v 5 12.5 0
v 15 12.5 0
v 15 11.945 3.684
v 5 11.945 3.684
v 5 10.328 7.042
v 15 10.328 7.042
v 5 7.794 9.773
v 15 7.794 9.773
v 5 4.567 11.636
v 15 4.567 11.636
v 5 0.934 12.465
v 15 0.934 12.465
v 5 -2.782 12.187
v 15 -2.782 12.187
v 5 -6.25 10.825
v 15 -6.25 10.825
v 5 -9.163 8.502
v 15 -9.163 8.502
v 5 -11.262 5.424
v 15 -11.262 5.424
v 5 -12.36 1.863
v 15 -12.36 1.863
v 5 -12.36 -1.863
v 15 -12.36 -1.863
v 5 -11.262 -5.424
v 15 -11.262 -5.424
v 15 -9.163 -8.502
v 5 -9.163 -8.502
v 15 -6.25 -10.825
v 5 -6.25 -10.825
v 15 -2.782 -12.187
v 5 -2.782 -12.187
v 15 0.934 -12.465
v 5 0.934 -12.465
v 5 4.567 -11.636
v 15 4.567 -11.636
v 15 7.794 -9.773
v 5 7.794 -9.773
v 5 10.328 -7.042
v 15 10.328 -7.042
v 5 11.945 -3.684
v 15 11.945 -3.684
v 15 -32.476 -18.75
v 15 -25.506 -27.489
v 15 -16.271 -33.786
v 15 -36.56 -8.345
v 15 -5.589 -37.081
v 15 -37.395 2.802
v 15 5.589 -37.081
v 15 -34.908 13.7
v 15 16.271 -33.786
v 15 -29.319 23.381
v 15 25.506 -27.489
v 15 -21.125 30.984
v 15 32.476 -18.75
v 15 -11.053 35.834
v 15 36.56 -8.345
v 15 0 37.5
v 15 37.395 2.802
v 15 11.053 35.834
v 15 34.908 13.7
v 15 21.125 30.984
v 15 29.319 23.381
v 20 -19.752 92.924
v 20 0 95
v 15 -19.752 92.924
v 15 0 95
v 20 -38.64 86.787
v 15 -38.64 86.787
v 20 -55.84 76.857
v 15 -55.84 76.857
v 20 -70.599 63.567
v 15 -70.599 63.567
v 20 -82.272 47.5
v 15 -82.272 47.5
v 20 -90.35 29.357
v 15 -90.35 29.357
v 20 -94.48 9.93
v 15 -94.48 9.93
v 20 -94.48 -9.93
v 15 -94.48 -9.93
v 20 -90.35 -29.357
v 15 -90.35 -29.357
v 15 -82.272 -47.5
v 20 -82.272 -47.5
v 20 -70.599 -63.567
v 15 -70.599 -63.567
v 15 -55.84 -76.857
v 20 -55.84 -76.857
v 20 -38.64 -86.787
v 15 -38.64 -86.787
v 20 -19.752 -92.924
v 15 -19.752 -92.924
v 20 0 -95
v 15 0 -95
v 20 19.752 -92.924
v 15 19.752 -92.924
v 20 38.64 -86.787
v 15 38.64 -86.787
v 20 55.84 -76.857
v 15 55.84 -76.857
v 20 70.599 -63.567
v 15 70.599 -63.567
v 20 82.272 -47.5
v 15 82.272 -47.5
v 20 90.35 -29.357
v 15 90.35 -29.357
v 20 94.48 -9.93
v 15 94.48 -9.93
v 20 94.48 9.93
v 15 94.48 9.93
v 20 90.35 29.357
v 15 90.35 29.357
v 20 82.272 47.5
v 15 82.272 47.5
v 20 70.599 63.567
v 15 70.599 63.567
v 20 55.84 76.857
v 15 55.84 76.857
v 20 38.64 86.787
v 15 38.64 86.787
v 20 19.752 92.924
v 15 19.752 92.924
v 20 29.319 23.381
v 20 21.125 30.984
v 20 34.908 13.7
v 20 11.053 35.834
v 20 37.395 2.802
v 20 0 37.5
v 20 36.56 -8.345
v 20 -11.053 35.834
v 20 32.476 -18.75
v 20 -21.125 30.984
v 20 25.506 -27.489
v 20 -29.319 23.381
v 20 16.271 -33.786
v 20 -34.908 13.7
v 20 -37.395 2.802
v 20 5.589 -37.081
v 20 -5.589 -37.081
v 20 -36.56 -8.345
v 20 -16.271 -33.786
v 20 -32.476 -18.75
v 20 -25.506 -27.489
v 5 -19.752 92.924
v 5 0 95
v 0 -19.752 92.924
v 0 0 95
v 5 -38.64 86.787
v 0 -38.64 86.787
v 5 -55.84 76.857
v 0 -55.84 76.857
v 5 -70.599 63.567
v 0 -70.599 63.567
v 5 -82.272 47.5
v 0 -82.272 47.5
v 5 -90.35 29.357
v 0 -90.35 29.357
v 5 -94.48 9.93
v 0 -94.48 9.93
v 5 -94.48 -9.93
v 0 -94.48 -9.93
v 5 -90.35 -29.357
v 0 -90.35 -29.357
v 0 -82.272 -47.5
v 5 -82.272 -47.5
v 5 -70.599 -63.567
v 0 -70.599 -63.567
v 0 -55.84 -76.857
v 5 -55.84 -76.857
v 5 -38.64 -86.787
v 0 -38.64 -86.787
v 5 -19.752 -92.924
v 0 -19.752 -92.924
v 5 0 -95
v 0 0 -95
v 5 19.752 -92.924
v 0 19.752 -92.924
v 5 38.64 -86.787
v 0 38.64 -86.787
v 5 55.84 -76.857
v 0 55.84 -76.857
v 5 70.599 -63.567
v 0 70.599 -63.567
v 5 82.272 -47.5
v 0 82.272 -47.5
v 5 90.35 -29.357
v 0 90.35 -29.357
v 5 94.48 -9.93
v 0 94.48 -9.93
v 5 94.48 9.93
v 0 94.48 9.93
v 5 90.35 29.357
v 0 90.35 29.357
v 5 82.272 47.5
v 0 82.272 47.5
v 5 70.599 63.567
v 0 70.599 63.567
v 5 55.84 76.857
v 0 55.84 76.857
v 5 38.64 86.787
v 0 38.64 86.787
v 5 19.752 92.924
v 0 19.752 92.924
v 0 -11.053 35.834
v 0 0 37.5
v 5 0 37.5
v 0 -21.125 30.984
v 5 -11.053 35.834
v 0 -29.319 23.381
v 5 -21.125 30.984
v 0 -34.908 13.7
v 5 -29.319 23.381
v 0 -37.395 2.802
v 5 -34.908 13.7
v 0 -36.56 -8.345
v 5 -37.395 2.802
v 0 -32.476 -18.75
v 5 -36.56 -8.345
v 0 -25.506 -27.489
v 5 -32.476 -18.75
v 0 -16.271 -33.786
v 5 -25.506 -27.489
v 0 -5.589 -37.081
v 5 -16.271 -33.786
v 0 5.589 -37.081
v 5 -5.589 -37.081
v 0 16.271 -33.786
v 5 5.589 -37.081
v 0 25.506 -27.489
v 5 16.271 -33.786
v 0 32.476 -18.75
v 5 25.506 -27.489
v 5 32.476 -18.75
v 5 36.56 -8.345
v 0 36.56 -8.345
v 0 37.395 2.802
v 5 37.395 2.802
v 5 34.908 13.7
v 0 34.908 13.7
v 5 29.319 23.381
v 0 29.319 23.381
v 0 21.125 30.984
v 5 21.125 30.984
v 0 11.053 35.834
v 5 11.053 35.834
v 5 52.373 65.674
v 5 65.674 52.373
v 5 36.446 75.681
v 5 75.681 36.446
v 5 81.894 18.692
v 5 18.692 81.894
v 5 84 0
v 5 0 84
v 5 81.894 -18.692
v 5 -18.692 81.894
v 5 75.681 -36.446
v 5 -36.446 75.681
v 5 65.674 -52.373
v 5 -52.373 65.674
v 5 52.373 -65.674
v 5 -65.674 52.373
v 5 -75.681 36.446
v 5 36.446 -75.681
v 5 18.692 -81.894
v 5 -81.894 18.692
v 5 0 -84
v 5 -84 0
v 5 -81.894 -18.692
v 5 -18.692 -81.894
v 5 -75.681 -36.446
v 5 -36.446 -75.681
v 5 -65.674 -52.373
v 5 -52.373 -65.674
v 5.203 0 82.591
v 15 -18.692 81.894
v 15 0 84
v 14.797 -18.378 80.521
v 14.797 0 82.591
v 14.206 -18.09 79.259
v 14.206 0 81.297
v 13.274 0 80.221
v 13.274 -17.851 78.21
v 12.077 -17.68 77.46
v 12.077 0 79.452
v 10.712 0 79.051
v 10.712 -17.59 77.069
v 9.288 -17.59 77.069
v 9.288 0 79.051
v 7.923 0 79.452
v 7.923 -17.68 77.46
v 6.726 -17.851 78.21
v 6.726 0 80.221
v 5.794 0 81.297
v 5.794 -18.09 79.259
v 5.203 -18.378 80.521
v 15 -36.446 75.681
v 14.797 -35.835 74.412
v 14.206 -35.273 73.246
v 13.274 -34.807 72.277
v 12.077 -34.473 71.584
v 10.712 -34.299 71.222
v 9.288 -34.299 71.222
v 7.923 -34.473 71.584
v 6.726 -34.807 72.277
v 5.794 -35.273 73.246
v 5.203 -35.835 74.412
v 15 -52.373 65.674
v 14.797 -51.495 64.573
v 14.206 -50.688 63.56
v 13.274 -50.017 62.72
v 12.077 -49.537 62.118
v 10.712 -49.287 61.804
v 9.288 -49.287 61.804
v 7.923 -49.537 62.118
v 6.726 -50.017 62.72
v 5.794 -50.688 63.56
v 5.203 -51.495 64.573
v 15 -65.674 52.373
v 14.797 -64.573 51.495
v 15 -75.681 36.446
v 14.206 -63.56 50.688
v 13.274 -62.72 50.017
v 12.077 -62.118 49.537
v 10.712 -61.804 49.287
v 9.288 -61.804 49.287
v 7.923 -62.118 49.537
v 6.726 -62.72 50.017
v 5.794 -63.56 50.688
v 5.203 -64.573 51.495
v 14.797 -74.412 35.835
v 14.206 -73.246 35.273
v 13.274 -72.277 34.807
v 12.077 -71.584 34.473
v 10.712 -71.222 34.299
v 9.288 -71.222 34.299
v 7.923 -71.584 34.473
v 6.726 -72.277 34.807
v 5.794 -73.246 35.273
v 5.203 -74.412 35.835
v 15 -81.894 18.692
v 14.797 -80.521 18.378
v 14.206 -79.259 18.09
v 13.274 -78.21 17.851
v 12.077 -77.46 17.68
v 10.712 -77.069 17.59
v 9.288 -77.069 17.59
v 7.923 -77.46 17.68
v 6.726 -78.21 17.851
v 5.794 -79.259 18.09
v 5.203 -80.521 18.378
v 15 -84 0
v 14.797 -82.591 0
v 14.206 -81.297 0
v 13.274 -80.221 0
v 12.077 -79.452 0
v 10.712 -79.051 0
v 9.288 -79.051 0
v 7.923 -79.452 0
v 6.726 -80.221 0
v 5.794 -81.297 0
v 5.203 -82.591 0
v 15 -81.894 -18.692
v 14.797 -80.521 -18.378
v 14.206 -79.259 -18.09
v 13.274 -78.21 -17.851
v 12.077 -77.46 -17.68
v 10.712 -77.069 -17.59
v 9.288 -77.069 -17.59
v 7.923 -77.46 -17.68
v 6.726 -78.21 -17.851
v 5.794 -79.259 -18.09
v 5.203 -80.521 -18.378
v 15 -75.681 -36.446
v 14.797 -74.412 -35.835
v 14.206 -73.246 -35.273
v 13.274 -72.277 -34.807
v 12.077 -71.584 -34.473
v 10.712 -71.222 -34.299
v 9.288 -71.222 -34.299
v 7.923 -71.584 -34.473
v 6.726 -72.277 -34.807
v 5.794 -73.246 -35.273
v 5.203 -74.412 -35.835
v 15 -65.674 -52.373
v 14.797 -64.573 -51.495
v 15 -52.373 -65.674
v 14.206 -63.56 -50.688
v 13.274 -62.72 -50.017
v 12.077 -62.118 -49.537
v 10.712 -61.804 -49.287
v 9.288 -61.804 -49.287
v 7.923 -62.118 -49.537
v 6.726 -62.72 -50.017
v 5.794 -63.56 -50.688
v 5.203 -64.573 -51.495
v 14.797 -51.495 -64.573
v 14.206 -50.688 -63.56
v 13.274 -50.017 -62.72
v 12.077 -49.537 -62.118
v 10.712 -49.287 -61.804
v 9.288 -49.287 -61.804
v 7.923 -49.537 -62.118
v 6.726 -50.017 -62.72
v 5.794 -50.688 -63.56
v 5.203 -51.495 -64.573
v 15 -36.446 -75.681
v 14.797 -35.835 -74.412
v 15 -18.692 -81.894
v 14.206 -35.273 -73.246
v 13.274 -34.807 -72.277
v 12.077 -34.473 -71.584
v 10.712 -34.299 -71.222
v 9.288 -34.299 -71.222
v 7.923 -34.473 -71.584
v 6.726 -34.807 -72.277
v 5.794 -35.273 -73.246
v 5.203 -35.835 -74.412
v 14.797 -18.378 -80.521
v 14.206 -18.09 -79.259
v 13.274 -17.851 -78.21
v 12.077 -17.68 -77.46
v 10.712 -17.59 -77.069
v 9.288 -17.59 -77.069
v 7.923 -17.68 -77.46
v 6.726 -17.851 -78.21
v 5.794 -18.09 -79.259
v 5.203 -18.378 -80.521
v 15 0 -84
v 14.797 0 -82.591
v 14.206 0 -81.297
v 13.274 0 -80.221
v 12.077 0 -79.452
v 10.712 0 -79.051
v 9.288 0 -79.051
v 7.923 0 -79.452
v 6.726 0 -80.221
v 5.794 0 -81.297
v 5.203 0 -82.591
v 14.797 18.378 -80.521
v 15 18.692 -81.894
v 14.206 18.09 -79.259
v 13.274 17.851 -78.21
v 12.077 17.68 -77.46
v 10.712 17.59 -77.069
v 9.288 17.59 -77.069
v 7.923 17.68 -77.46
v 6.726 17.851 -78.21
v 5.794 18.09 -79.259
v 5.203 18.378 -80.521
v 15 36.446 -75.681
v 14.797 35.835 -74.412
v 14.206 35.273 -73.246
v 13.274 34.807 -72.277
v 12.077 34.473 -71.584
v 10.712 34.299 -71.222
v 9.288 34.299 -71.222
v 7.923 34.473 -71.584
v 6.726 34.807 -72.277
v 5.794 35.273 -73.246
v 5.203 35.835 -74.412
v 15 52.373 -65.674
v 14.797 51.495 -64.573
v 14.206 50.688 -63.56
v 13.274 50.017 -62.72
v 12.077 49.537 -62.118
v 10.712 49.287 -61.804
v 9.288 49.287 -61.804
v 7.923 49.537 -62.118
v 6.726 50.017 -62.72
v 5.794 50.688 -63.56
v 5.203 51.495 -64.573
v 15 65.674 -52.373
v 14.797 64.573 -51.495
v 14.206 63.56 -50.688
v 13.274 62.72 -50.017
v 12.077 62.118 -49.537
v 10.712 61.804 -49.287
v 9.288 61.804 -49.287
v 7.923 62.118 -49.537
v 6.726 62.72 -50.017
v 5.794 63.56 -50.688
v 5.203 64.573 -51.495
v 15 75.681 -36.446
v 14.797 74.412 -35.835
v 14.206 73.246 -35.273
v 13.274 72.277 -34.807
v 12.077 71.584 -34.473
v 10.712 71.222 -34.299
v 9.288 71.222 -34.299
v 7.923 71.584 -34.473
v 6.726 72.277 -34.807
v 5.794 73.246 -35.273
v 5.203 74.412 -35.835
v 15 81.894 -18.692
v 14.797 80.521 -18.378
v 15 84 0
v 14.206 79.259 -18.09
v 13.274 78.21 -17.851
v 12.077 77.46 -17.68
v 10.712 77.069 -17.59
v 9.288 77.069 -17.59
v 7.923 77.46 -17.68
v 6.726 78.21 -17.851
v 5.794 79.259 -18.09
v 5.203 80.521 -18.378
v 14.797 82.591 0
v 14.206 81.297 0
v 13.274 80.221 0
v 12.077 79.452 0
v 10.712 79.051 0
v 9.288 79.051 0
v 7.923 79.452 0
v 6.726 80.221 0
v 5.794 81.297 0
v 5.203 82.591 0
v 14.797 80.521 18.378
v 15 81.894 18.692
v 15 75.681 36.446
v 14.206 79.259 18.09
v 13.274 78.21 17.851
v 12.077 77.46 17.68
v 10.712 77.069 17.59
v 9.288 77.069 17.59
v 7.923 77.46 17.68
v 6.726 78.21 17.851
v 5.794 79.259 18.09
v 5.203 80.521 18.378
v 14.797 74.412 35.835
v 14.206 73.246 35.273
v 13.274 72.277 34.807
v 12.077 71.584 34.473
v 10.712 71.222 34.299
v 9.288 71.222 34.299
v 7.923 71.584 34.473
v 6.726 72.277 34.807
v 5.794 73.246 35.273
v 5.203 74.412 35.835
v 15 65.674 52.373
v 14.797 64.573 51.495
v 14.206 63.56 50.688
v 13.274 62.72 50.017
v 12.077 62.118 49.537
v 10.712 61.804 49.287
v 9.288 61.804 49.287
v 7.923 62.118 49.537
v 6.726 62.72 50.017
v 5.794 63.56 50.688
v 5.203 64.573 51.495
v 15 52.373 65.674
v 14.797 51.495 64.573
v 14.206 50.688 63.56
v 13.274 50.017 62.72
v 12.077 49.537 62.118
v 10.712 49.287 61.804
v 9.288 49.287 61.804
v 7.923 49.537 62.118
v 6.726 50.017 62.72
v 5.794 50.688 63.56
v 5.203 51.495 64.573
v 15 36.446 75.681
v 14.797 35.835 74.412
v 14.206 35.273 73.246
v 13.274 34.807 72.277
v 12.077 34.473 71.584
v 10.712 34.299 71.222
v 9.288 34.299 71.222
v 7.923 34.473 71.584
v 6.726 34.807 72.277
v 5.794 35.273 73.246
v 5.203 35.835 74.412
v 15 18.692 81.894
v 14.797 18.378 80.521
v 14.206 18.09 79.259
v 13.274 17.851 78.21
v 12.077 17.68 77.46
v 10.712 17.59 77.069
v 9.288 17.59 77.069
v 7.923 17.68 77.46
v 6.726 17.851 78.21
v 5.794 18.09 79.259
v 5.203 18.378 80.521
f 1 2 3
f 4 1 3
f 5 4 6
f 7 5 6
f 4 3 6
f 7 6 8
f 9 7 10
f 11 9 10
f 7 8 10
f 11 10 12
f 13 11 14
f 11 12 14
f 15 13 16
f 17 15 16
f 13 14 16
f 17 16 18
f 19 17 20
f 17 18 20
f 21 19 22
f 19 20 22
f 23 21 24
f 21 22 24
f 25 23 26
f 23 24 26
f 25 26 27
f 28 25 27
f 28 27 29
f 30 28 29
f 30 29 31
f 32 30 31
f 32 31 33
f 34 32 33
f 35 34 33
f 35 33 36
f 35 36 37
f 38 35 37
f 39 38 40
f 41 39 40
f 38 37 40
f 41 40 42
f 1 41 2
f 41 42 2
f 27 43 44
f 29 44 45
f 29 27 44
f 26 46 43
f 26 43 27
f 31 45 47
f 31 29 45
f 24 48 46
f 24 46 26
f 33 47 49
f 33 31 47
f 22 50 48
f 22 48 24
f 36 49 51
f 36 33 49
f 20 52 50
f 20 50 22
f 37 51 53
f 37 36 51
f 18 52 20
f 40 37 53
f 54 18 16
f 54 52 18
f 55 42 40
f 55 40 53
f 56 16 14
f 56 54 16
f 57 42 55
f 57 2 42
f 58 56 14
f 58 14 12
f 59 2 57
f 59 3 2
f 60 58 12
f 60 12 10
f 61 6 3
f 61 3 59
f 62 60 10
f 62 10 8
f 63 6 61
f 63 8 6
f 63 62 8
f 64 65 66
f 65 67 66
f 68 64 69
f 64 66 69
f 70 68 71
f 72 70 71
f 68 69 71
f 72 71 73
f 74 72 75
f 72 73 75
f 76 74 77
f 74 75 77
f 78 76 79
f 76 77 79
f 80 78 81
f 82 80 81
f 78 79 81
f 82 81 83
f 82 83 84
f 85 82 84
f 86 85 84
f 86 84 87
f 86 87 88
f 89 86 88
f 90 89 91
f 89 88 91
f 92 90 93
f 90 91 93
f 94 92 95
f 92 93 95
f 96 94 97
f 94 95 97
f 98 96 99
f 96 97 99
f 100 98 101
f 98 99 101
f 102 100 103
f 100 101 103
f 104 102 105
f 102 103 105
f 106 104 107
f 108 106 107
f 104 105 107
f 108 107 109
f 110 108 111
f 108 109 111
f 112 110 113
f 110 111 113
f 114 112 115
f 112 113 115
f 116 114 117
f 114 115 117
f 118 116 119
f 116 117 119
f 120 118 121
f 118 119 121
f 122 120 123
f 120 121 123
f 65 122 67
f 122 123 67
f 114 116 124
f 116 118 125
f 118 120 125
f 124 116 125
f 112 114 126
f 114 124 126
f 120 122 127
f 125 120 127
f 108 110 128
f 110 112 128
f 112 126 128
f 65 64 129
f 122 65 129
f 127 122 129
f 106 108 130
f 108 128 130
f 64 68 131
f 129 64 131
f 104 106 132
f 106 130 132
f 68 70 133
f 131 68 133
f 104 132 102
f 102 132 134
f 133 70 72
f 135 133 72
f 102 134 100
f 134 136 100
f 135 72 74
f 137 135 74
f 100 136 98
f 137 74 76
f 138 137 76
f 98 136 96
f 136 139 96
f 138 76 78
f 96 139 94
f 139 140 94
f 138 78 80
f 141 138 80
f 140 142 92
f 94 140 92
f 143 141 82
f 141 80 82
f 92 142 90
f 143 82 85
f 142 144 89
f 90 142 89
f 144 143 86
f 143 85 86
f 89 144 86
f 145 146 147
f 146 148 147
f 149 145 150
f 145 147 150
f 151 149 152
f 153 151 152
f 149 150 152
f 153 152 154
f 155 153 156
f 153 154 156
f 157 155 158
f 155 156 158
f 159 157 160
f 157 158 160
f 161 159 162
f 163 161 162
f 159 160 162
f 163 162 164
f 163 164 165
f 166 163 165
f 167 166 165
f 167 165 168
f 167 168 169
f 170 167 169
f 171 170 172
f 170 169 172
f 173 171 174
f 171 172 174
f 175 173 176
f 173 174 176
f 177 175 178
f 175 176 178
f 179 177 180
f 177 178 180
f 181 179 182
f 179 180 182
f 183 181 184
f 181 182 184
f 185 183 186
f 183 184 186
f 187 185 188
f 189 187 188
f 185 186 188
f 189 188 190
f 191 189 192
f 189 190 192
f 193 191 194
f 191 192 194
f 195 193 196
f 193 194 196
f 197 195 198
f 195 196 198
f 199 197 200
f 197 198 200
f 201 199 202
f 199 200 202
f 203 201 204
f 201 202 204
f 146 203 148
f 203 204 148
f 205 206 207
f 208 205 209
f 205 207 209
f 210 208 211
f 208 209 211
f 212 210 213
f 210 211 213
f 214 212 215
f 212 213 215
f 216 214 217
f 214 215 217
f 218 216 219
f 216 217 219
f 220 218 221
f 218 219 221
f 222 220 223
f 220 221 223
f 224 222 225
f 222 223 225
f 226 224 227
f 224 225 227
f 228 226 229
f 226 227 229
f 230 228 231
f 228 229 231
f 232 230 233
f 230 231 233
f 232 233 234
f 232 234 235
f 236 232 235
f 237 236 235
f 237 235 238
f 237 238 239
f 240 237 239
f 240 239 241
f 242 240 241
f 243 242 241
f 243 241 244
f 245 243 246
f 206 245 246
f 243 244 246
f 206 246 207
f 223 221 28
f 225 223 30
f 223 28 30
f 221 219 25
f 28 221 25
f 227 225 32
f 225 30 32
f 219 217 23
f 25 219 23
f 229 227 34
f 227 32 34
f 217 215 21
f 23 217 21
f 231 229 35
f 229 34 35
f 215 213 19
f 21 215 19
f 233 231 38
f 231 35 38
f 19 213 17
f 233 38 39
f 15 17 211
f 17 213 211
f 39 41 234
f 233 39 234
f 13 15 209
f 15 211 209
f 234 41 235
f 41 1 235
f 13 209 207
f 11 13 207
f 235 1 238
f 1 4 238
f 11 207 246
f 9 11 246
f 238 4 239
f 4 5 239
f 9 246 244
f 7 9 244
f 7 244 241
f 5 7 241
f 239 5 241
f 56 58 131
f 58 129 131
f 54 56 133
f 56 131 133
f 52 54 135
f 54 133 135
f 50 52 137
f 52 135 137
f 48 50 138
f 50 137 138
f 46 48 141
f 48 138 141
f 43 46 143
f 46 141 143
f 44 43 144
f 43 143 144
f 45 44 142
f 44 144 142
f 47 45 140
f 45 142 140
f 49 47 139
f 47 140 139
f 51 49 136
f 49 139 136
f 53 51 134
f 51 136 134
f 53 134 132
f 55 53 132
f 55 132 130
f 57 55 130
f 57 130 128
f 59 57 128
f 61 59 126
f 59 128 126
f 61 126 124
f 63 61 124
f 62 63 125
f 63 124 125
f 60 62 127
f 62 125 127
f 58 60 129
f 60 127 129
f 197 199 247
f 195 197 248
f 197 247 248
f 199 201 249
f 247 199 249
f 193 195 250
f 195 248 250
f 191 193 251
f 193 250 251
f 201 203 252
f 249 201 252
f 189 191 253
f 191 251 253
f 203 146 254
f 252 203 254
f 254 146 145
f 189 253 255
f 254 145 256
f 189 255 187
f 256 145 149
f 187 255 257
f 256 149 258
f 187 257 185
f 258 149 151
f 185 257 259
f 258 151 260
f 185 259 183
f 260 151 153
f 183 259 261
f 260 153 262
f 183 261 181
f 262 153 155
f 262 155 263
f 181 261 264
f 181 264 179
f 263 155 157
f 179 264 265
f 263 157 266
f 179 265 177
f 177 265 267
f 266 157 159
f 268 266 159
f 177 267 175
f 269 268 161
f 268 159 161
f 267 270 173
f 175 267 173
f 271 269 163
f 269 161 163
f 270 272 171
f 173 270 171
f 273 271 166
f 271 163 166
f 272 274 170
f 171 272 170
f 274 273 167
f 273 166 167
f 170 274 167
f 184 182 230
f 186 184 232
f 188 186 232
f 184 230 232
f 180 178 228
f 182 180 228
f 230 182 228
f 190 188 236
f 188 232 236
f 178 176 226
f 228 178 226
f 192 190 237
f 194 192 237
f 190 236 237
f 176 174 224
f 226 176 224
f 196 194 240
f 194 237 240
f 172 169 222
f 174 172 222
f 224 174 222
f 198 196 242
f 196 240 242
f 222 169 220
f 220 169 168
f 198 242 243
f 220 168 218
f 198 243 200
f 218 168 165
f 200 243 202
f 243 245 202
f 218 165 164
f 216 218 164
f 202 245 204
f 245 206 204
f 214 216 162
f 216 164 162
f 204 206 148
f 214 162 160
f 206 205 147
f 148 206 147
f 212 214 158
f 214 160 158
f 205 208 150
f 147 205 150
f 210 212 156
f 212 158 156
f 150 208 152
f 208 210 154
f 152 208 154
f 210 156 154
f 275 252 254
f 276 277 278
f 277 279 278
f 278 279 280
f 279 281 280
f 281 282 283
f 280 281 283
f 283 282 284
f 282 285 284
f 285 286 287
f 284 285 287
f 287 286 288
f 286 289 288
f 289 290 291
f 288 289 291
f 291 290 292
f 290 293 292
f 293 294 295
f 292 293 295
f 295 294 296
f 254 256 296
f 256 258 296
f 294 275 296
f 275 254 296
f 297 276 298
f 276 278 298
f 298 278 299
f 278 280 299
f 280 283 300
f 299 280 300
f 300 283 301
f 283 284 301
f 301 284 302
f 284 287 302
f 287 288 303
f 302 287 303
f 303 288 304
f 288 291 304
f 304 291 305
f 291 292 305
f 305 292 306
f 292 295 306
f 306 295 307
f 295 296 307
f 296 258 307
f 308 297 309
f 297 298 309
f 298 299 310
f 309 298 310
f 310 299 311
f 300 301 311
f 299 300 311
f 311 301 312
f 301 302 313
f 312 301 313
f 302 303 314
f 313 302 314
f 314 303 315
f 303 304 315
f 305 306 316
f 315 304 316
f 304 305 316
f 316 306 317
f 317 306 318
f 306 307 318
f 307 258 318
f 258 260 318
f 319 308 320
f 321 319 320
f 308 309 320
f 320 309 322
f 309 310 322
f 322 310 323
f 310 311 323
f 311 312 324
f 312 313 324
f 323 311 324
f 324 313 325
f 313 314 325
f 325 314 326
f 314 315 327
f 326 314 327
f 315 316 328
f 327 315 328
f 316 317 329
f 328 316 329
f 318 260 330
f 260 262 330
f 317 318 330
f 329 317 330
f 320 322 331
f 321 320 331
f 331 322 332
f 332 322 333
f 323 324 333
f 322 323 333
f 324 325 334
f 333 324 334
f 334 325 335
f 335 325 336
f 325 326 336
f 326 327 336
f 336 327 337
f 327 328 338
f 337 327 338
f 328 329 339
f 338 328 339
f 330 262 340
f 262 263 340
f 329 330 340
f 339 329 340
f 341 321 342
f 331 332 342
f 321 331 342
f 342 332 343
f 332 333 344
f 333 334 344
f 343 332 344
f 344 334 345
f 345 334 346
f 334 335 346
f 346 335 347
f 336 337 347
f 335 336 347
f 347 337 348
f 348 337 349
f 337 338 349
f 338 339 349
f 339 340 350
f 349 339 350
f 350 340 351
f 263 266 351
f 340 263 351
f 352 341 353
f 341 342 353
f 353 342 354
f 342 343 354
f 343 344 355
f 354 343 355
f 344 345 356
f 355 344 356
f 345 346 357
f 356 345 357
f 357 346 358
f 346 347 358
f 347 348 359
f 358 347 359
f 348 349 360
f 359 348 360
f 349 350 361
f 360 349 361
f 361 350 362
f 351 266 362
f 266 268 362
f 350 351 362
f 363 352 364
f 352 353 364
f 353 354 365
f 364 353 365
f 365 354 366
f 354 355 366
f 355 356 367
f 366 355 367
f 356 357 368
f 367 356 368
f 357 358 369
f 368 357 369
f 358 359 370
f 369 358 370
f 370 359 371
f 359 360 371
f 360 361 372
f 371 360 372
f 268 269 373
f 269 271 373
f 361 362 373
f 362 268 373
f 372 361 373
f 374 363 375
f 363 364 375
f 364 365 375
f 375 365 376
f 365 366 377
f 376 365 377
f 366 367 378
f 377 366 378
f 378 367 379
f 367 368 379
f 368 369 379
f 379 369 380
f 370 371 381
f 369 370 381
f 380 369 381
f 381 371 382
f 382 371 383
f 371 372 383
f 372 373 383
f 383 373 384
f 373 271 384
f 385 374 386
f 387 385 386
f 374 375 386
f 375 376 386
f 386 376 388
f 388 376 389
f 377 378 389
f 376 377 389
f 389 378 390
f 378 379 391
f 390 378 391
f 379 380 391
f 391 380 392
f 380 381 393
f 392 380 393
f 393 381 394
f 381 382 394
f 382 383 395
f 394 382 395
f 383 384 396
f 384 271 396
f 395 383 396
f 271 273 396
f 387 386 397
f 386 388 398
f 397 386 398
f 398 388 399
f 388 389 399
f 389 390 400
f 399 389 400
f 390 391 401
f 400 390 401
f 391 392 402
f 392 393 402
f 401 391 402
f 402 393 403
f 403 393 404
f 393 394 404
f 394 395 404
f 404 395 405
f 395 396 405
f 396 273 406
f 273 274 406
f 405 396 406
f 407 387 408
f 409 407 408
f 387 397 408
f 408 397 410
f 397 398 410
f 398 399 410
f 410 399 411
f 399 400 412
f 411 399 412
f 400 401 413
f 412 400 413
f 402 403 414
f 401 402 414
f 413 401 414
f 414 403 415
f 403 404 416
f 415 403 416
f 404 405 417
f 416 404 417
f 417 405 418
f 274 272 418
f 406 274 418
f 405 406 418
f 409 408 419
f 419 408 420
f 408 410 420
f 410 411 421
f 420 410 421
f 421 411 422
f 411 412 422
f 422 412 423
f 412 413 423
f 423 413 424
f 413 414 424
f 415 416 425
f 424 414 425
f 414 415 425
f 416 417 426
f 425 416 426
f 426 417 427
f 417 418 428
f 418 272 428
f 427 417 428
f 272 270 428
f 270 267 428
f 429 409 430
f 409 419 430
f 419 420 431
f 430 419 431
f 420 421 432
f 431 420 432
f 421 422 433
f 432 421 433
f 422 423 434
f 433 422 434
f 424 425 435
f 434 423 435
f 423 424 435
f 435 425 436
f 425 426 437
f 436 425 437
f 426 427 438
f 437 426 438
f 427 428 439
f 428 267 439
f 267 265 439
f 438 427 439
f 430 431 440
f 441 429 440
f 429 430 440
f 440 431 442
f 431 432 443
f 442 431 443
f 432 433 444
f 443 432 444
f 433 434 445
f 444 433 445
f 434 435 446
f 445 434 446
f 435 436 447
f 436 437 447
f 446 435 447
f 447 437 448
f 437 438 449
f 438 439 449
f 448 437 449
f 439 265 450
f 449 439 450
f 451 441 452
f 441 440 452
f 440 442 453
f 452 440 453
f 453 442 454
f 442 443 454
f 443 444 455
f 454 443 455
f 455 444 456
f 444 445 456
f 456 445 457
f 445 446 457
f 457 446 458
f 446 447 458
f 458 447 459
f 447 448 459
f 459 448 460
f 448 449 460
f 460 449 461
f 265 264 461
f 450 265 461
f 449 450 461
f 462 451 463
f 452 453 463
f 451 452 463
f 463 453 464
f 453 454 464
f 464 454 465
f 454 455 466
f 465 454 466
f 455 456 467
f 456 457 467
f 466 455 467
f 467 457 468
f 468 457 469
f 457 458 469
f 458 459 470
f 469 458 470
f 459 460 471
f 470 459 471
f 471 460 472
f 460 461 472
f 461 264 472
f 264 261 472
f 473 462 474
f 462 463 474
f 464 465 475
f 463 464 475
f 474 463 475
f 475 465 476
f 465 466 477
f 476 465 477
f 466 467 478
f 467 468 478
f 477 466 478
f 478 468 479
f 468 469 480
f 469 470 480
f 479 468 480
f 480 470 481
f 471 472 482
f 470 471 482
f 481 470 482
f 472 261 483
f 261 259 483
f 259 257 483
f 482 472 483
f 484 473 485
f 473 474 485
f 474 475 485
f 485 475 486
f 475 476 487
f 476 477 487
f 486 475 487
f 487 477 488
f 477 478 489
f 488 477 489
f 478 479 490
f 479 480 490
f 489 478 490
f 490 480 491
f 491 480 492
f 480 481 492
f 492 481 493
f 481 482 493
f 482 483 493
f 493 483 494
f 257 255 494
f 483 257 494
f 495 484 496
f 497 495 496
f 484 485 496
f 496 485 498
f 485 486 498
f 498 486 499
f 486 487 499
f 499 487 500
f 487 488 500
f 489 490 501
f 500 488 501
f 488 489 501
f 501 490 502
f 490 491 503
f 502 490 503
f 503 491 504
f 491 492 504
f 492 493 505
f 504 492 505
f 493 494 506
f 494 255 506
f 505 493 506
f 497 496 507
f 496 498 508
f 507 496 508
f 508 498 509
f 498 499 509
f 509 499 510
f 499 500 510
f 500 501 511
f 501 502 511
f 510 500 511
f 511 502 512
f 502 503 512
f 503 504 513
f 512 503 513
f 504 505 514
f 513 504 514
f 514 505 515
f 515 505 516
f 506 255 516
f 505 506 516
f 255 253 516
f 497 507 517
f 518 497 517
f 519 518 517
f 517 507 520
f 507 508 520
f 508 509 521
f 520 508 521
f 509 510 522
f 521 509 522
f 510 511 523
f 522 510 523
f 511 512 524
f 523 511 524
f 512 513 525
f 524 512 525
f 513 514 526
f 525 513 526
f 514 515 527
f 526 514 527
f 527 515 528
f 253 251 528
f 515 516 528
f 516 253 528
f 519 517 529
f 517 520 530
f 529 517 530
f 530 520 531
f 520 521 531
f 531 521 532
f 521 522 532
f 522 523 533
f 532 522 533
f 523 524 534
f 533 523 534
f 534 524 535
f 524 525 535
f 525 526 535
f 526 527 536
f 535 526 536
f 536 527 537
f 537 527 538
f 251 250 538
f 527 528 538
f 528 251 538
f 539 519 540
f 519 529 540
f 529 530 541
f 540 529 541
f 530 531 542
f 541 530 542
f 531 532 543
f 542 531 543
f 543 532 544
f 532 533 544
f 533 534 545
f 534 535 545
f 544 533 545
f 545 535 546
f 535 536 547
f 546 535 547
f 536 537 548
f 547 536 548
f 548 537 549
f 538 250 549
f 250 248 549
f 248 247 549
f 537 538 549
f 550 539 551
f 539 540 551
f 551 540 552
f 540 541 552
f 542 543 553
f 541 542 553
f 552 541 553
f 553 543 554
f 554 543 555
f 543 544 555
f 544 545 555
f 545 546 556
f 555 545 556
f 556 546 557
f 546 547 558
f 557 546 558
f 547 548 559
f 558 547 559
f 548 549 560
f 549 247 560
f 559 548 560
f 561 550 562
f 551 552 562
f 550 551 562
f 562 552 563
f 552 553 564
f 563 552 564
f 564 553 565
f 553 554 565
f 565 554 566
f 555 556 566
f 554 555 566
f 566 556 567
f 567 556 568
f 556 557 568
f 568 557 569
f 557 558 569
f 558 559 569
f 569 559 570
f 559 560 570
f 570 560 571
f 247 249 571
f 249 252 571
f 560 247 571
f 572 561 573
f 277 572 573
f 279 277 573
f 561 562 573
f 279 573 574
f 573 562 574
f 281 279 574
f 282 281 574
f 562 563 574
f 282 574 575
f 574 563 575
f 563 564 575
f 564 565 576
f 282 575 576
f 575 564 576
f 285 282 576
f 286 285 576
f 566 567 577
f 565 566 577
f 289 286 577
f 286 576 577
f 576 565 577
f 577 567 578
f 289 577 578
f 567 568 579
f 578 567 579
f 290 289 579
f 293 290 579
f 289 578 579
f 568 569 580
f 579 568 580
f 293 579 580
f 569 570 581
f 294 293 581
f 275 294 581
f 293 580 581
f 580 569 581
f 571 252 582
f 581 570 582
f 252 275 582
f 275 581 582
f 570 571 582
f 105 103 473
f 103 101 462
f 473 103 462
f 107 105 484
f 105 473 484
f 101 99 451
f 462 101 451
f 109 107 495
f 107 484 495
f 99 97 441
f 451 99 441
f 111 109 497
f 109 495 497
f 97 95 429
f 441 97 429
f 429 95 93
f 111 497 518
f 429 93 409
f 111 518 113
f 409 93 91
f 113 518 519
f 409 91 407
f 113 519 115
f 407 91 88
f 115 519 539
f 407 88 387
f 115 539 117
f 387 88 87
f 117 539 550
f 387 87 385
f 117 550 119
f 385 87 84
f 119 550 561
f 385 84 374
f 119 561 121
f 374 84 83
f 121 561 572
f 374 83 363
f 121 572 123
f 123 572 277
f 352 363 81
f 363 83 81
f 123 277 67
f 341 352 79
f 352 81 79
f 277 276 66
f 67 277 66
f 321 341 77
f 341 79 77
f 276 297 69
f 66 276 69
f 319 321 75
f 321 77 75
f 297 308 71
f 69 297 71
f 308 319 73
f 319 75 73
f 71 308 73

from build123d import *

# Parameters (mm, degrees)
F3_START = -5
F2_R     = 37.5
F2_R_2   = 12.5
F3_DEPTH = 10


with BuildPart() as f1:
    # F0 (on Front) → F1 (revolve)
    with BuildSketch(Plane.XZ):
        with BuildLine():
            Line((0, 95), (0, 37.5))
            Line((0, 37.5), (20, 37.5))
            Line((20, 37.5), (20, 95))
            Line((20, 95), (15, 95))
            Line((15, 95), (15, 84))
            ThreePointArc((15, 84), (10, 79), (5, 84))
            Line((5, 84), (5, 95))
            Line((5, 95), (0, 95))
        make_face()
    revolve(axis=Axis((28.1461849809, 0, 0), (1, 0, 0)))

    # F2 (on face) → F3 (join)
    with BuildSketch(Plane.YZ.offset(20).offset(F3_START)):
        Circle(F2_R)
        Circle(F2_R_2, mode=Mode.SUBTRACT)
    extrude(amount=-F3_DEPTH)


solid = f1.part
